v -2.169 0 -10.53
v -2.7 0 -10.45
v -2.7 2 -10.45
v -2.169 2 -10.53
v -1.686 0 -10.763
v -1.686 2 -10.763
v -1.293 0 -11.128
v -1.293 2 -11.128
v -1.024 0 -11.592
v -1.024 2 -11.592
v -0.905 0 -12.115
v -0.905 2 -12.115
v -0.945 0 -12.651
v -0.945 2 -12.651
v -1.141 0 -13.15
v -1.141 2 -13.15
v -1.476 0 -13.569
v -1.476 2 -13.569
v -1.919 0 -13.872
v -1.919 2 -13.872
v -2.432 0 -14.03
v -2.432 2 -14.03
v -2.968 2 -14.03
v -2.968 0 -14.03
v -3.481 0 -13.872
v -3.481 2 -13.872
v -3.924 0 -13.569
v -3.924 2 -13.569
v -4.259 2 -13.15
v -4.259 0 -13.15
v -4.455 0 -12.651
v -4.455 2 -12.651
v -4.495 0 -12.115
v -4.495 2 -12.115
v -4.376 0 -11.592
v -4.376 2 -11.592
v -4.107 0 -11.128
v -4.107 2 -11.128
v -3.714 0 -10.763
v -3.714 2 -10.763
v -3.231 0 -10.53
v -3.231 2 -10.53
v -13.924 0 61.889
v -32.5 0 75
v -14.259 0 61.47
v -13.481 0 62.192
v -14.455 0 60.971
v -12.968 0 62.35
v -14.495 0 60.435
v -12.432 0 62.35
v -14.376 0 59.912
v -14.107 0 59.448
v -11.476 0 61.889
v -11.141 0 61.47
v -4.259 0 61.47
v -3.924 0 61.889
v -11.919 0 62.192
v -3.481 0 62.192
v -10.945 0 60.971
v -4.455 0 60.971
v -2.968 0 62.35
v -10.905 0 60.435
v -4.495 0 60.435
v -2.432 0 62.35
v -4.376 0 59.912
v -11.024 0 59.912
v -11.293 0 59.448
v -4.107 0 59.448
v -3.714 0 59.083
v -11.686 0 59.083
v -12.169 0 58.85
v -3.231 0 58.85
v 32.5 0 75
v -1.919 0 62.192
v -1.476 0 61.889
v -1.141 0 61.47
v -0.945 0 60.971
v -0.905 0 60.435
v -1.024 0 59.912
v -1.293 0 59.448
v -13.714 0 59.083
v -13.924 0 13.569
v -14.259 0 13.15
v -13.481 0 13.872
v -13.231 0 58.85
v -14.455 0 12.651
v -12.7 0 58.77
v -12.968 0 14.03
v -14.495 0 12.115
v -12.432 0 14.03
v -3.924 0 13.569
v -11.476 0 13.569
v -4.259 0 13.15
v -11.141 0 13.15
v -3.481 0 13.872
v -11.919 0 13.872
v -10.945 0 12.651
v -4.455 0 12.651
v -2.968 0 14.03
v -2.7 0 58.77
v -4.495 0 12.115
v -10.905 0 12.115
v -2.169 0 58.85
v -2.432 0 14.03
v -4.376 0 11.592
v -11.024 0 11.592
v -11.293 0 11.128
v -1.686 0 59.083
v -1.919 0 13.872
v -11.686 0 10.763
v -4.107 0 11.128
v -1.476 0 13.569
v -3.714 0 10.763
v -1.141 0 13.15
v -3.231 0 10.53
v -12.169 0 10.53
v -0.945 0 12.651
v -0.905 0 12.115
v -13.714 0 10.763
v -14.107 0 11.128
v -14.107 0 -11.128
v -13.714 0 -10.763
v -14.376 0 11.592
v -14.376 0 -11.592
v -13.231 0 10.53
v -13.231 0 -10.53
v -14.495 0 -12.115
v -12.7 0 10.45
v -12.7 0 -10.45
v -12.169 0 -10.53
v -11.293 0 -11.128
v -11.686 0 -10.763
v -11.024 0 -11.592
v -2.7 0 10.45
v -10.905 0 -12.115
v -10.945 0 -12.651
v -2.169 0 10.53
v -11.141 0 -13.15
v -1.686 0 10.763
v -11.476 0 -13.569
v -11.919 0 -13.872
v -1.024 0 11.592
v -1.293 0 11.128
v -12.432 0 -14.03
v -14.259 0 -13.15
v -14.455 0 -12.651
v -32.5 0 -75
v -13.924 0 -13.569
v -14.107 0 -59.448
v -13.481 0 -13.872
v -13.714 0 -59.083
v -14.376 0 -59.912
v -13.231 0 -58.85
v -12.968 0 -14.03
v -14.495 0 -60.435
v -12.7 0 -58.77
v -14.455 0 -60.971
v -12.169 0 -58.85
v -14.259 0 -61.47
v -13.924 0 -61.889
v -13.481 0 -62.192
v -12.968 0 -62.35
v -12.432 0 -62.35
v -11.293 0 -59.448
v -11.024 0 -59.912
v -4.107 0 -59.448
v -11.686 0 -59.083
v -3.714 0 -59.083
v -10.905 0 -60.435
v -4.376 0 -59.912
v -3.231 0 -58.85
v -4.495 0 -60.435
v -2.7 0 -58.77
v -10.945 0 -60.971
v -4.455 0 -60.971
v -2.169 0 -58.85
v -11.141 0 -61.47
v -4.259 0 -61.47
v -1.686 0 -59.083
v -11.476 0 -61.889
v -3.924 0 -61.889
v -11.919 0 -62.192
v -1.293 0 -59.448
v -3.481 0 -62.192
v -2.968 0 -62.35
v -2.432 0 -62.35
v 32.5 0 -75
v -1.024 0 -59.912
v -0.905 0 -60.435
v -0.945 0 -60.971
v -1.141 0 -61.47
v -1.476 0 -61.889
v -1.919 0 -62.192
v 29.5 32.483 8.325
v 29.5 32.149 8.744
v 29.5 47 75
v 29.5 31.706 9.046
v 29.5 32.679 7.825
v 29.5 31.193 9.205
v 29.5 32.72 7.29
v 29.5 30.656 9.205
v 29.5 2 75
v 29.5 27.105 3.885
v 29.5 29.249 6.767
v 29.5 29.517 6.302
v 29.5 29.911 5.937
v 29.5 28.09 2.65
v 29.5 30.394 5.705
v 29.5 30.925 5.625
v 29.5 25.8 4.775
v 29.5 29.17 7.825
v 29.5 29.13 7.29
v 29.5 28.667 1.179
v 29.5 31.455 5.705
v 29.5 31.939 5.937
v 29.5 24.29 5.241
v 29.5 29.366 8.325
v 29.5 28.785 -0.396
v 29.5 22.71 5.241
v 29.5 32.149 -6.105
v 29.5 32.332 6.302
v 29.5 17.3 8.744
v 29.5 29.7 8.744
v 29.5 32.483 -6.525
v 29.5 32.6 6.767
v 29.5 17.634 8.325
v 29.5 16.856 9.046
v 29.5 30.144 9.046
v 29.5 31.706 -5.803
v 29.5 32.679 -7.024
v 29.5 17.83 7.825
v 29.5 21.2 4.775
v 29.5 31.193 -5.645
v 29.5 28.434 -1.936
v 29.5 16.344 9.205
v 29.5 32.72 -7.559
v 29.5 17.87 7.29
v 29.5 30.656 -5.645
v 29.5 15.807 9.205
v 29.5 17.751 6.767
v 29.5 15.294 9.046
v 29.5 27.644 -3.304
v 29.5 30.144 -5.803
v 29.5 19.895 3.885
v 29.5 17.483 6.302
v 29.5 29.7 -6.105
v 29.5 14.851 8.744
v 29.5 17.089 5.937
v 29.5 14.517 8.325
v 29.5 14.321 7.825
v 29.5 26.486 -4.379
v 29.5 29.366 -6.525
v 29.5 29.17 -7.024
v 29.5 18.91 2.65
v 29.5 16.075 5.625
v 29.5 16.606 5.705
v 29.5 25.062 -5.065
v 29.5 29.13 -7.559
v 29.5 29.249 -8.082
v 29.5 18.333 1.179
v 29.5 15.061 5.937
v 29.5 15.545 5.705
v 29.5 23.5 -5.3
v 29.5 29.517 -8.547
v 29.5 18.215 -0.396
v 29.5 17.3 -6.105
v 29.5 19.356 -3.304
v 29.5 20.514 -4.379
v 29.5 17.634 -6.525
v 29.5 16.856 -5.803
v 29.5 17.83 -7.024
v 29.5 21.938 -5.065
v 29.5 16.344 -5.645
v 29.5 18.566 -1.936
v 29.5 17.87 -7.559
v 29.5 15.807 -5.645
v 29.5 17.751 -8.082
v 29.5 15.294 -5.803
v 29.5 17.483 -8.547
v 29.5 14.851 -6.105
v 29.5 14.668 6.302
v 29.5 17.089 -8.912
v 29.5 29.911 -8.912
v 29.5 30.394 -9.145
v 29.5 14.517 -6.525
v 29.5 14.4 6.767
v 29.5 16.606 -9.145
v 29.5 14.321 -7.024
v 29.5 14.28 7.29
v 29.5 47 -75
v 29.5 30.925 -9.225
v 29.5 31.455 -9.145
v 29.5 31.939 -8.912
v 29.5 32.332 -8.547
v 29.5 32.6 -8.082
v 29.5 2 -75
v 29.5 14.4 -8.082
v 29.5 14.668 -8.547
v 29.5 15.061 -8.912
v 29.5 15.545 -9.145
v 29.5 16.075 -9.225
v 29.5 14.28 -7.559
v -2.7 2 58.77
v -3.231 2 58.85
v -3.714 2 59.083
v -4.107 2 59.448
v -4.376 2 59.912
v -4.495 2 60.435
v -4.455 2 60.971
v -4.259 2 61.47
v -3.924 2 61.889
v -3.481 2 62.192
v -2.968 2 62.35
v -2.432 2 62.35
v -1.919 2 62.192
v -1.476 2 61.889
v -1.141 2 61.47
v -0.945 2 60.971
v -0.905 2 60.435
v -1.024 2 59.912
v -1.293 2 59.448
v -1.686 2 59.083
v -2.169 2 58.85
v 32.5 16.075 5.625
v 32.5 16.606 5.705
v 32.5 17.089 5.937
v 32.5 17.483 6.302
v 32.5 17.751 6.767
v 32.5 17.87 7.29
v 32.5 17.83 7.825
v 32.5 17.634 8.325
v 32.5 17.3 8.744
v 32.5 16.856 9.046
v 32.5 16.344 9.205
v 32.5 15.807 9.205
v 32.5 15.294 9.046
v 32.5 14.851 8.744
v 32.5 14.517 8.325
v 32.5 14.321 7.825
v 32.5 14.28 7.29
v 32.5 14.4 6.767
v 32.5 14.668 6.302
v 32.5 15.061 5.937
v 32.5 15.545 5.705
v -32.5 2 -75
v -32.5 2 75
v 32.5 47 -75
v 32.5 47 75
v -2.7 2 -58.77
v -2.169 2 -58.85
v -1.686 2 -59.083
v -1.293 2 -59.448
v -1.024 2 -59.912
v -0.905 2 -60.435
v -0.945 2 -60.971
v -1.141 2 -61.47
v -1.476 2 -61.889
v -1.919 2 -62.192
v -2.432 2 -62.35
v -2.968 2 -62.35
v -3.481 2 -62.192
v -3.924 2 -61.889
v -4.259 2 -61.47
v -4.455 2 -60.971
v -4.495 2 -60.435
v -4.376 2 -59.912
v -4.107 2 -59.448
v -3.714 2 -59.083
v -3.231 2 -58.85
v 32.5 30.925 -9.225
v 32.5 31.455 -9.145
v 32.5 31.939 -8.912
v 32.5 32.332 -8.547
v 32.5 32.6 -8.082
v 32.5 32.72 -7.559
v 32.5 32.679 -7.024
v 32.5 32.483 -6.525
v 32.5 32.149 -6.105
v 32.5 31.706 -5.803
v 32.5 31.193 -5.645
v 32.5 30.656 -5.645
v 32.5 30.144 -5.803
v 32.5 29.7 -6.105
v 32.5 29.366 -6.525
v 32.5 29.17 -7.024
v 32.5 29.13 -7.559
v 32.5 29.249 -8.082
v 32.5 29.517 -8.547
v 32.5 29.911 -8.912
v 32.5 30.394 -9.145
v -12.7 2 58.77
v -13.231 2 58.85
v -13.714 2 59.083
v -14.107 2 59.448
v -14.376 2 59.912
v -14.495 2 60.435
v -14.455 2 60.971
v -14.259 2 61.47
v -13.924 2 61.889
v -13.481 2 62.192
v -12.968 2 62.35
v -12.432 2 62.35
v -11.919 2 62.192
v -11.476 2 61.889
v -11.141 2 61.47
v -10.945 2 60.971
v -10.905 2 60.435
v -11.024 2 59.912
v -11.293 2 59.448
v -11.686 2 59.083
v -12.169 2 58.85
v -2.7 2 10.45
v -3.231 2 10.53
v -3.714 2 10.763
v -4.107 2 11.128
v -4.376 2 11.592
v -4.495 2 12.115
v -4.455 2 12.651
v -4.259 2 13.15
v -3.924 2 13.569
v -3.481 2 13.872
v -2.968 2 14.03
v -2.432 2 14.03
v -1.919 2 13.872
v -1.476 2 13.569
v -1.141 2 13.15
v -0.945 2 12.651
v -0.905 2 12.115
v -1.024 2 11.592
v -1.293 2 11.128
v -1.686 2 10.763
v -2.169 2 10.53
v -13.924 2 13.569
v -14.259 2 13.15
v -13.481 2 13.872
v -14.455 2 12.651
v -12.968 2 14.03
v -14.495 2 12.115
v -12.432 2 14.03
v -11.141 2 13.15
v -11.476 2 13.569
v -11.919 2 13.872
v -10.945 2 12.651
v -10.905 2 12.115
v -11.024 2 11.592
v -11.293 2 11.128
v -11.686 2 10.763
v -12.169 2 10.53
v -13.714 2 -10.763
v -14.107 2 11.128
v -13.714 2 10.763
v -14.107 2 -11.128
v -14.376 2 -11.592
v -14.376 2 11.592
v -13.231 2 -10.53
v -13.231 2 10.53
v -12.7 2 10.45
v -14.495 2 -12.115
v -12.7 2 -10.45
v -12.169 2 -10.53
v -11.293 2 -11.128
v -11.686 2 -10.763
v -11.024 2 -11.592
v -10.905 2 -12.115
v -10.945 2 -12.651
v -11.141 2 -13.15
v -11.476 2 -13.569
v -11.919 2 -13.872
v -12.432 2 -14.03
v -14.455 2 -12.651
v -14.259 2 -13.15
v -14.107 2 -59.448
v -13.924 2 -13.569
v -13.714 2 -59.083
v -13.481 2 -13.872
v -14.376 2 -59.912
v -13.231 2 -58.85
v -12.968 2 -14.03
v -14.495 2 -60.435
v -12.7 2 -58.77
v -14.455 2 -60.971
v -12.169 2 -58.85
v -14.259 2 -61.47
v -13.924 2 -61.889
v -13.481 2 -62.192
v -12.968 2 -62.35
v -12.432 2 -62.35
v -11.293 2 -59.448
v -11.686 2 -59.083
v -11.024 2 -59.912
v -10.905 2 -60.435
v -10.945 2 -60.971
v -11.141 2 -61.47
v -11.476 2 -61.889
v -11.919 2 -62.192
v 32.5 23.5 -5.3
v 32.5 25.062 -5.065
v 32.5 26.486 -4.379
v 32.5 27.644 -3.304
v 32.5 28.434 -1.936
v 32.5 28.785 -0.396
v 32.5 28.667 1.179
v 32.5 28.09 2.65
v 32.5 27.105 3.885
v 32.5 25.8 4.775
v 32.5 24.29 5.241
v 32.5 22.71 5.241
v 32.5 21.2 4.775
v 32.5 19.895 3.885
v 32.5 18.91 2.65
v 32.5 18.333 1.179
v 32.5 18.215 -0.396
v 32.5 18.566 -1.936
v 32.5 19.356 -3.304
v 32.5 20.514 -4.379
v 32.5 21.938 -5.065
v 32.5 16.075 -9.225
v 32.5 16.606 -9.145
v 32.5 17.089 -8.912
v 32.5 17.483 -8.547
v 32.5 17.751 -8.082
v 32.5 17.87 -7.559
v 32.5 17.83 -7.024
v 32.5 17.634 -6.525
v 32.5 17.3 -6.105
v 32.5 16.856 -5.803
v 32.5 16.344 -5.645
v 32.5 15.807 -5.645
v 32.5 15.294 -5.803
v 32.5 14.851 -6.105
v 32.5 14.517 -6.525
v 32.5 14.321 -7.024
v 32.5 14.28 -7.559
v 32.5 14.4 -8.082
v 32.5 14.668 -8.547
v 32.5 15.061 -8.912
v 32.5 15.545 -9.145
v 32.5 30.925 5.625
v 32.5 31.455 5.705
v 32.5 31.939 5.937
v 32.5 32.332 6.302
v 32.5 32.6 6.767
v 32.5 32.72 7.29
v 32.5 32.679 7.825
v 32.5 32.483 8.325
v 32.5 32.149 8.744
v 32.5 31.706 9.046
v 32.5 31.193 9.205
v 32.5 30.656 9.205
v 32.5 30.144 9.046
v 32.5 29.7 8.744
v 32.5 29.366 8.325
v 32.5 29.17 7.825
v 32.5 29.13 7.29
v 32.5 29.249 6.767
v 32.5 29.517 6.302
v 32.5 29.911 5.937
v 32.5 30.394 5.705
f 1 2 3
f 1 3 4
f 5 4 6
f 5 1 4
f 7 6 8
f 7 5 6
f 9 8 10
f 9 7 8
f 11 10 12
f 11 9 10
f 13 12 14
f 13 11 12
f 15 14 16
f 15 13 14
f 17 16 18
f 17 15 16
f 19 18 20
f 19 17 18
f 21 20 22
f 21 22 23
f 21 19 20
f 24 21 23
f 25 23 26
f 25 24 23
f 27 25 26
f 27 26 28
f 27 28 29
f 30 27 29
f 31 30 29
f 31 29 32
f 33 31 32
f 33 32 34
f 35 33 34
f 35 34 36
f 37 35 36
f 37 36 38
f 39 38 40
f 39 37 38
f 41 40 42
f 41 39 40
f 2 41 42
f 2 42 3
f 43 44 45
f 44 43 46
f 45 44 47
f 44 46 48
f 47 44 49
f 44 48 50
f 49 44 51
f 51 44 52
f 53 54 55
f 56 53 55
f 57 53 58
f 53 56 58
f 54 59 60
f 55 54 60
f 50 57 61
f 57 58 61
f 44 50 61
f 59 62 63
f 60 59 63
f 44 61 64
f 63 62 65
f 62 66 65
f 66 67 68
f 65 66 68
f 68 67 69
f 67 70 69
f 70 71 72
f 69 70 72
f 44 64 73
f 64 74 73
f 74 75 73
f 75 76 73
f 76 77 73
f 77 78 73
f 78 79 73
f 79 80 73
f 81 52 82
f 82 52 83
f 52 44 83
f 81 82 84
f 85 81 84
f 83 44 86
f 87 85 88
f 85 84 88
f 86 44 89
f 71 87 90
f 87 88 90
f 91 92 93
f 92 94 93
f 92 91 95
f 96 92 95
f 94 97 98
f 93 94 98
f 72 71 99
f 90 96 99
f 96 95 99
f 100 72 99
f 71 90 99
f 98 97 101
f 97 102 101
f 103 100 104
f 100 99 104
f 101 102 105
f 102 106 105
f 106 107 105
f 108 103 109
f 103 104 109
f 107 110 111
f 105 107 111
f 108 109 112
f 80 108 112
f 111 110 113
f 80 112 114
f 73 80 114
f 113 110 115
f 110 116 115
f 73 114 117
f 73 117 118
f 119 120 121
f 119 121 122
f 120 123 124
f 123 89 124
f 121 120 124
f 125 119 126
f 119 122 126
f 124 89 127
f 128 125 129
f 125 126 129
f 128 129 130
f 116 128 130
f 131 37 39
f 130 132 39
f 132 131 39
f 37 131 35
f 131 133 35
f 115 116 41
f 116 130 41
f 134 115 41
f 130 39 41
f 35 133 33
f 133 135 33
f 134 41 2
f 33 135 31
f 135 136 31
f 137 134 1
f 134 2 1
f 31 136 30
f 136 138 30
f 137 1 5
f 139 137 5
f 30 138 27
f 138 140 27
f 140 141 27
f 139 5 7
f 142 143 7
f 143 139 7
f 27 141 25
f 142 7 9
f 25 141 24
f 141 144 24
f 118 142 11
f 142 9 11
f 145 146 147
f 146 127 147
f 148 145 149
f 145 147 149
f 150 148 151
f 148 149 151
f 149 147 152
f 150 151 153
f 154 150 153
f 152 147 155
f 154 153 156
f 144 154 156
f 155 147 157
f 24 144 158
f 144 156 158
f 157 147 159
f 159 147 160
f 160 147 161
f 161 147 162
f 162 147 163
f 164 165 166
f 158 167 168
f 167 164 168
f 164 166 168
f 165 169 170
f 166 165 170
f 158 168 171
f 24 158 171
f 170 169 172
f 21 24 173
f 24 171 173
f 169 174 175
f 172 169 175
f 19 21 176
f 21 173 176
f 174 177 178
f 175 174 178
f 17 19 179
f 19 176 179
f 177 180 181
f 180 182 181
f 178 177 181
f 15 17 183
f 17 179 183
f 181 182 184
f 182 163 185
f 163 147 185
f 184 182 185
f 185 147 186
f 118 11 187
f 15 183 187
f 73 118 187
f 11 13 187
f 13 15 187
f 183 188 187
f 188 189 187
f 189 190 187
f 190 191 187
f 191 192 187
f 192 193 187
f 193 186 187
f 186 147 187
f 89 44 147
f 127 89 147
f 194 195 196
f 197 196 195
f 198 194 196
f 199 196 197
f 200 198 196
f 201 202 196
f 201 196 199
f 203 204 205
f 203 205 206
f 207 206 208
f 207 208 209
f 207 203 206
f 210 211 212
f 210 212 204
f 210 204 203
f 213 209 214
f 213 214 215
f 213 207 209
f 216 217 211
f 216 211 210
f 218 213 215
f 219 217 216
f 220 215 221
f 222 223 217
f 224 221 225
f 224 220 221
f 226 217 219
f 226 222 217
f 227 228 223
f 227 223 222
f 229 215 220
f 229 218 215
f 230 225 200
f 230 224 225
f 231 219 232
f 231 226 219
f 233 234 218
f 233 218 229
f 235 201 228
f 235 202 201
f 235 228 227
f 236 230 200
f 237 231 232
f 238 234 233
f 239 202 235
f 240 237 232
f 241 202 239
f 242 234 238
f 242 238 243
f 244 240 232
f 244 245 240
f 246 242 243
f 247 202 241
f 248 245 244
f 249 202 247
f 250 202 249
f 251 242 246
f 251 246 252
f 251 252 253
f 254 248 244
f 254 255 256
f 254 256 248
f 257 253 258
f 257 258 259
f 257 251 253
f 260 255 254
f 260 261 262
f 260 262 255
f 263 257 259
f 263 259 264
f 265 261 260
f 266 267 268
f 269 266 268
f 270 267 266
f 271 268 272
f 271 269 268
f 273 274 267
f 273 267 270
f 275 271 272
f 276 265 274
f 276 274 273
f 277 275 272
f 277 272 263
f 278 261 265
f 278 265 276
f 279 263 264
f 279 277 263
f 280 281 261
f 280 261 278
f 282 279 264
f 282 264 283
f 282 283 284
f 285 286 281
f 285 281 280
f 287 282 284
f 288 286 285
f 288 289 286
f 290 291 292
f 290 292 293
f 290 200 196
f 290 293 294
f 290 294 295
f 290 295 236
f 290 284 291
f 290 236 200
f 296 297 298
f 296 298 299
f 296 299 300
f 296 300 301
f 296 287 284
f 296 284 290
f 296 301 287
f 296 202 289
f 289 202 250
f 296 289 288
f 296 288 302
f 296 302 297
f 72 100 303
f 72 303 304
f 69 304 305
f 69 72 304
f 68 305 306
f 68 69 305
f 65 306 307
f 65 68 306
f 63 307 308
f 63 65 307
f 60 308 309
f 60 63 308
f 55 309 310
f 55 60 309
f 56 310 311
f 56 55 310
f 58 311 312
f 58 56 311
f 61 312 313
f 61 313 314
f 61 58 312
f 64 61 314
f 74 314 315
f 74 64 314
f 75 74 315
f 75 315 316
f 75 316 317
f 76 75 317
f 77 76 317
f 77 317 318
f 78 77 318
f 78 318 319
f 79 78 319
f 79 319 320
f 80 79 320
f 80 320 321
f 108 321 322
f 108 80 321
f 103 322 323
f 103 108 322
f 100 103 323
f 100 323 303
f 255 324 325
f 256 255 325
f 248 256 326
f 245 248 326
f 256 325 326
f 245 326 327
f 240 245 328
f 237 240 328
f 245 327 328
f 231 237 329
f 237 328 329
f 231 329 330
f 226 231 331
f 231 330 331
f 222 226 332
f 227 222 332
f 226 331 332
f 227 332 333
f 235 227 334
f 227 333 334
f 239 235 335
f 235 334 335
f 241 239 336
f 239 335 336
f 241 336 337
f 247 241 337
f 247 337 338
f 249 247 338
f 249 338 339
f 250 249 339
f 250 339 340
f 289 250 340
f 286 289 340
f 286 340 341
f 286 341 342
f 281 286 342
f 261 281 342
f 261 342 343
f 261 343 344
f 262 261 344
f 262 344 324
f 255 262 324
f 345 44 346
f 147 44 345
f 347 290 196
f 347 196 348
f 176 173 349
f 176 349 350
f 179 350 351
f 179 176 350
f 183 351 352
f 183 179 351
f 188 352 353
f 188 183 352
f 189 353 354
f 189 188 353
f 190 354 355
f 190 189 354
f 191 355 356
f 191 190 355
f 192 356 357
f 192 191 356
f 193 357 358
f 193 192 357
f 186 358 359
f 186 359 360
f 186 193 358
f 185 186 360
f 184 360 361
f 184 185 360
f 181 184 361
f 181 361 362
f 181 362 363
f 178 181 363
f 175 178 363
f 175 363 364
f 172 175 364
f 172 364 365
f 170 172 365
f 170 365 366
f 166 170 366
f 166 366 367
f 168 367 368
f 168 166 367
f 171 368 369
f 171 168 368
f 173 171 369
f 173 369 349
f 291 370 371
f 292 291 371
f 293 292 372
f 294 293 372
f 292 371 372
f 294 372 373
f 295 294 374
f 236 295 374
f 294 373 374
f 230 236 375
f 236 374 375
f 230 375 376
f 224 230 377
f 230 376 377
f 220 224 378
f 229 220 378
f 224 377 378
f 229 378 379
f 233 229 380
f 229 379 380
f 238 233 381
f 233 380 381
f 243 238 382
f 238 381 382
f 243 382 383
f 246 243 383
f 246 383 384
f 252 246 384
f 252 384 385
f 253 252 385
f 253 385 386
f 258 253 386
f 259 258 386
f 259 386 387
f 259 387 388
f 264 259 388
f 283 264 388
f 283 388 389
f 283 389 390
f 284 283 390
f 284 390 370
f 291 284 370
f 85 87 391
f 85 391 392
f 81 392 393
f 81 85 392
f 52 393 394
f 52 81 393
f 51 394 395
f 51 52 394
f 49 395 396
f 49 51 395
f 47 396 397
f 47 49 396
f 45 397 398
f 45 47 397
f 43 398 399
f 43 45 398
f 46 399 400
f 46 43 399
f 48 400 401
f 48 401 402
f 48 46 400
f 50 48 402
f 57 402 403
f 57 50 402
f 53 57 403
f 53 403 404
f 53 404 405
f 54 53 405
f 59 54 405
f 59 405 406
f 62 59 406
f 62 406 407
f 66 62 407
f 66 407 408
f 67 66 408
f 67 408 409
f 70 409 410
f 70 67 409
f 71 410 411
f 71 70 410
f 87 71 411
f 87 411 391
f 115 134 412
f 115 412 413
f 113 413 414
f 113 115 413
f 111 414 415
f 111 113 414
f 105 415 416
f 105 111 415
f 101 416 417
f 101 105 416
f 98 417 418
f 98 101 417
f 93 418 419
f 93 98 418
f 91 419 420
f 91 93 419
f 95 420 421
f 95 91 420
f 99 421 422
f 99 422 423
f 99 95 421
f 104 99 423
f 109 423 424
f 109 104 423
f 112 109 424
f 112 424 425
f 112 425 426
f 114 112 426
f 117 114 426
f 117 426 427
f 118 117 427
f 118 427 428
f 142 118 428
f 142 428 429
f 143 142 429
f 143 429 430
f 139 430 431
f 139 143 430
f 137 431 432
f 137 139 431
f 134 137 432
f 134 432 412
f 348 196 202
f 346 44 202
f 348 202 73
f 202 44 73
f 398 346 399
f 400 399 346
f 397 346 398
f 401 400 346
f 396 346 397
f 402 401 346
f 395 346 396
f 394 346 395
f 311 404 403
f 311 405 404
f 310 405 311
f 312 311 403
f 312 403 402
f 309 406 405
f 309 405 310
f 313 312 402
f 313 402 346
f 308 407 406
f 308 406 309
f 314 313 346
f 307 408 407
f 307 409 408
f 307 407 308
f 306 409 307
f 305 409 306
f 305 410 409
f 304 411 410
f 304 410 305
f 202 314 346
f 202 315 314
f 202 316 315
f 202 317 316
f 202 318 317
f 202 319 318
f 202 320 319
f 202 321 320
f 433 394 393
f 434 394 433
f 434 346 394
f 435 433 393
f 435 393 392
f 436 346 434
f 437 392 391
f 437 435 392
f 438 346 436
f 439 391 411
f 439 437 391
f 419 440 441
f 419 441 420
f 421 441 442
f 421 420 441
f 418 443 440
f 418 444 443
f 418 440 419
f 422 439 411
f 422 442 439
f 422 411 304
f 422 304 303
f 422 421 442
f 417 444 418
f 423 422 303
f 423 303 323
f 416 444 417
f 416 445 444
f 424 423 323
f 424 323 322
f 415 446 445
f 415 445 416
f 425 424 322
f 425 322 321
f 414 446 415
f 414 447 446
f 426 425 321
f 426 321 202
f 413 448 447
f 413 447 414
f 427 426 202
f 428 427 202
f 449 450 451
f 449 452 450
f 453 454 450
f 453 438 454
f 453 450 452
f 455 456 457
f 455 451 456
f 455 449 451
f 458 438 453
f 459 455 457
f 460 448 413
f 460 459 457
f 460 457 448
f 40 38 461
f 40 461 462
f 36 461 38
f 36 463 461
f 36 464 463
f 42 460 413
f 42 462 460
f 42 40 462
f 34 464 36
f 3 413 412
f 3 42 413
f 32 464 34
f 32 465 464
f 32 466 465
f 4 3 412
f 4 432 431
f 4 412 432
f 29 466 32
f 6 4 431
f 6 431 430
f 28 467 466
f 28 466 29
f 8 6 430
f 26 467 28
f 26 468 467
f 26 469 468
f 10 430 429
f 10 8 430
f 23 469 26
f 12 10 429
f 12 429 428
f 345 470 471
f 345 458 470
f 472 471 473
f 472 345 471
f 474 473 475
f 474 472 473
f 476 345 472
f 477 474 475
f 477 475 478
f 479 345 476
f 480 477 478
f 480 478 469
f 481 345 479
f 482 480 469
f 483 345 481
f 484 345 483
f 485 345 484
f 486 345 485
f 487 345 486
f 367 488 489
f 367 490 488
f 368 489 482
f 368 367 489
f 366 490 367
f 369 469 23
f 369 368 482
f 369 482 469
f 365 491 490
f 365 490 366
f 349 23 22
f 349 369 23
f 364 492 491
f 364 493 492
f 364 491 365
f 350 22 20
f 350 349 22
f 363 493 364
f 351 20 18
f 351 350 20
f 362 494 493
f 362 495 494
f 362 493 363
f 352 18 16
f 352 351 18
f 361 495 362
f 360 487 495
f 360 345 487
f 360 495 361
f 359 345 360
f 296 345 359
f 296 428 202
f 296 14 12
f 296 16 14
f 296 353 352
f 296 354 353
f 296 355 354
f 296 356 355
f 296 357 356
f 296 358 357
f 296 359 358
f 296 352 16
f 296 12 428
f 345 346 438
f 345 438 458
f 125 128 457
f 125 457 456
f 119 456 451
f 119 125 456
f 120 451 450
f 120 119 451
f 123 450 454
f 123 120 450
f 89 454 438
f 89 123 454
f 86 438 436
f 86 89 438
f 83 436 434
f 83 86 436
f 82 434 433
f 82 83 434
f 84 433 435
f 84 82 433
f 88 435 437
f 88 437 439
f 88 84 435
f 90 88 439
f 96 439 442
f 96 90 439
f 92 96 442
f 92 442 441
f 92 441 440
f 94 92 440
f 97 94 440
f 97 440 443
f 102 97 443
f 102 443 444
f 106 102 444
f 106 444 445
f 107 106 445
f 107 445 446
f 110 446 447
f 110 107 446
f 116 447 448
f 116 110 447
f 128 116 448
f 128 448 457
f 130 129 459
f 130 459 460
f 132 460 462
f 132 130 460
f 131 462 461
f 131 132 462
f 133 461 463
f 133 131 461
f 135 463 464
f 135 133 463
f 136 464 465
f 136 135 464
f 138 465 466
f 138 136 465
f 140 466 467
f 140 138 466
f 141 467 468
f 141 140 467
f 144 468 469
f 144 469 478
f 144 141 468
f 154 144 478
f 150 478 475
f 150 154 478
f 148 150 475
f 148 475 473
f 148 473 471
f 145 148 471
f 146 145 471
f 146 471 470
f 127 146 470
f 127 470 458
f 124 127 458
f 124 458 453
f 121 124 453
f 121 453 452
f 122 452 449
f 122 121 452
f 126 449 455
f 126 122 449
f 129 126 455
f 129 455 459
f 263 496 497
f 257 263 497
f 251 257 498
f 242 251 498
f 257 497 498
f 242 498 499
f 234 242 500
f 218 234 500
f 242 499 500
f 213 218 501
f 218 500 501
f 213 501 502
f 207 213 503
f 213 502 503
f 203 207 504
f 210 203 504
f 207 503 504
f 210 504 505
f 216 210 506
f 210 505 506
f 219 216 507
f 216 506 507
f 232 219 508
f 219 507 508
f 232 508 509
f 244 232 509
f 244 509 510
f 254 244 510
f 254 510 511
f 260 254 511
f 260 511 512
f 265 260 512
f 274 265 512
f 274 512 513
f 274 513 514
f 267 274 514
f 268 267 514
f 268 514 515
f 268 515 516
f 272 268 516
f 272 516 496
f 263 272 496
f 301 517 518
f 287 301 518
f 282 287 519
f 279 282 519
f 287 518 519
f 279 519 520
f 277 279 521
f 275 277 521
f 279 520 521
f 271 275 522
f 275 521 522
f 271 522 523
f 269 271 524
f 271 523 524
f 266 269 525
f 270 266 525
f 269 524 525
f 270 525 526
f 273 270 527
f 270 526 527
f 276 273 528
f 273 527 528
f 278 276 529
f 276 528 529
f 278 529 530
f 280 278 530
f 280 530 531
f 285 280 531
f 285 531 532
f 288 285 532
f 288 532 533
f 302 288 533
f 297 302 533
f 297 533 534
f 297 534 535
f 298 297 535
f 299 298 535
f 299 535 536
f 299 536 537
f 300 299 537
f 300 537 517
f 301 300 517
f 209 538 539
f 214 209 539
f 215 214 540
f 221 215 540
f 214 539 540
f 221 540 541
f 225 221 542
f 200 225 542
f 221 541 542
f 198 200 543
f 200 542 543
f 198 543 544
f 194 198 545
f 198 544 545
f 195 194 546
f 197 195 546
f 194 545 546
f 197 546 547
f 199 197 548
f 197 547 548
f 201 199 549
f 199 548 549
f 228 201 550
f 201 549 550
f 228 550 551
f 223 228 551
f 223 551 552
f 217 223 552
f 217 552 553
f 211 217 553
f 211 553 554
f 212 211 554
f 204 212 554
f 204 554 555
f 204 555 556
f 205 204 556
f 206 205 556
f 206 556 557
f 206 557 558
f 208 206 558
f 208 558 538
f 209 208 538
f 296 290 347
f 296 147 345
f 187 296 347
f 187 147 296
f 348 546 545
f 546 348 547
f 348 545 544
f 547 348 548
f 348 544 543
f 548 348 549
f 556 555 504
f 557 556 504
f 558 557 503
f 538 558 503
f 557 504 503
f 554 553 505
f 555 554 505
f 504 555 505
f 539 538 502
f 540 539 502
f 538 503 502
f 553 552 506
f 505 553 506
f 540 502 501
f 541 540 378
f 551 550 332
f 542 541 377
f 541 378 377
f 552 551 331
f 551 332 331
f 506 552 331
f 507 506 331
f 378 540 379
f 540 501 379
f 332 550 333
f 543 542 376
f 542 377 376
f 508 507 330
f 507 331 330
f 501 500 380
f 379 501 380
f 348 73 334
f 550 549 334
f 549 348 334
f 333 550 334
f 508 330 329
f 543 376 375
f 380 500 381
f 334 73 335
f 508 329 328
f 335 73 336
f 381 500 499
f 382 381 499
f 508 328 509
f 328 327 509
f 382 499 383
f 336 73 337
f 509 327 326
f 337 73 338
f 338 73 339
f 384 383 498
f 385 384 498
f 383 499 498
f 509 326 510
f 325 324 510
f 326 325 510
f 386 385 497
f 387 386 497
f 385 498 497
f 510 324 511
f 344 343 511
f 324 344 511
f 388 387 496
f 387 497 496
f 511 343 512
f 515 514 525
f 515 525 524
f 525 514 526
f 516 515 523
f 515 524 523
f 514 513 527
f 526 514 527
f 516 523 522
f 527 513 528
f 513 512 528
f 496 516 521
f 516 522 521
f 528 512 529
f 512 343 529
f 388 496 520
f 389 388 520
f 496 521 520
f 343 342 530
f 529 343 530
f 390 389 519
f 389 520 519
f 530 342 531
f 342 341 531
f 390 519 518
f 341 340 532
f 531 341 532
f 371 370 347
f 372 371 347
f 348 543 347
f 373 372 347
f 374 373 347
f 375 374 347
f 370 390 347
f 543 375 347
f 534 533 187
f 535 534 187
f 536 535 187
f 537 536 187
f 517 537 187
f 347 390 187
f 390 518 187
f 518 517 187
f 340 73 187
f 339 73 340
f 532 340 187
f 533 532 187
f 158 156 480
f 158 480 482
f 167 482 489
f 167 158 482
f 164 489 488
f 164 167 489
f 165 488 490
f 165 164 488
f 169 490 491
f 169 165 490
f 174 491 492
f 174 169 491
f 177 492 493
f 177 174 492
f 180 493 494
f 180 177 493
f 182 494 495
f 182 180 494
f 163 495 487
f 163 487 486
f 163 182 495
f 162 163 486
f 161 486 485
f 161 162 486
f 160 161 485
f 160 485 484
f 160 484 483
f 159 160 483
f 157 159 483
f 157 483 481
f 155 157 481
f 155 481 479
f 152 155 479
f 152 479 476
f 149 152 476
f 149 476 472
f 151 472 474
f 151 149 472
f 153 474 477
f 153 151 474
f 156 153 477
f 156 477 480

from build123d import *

# Parameters (mm, degrees)
CROQUIS1_W              = 65
CROQUIS1_H              = 150
CROQUIS1_R              = 1.8
SALIENTE_EXTRUIR1_DEPTH = 2
CROQUIS2_W              = 3
CROQUIS2_H              = 150
SALIENTE_EXTRUIR2_DEPTH = 45
CROQUIS3_R              = 5.3
CROQUIS3_R_2            = 1.8
CORTAR_EXTRUIR1_DEPTH   = 10


with BuildPart() as part:
    # Croquis1 → Saliente-Extruir1 (new body)
    with BuildSketch(Plane(origin=(0, 0, 0), x_dir=(1, 0, 0), z_dir=(0, 1, 0))):
        Rectangle(CROQUIS1_W, CROQUIS1_H)
        with Locations(Location((-2.7, 12.25, 0), (0, 0, 270))):
            Circle(CROQUIS1_R, mode=Mode.SUBTRACT)
        with Locations(Location((-2.7, 60.57, 0), (0, 0, 270))):
            Circle(CROQUIS1_R, mode=Mode.SUBTRACT)
        with Locations(Location((-12.7, -60.57, 0), (0, 0, 90))):
            Circle(CROQUIS1_R, mode=Mode.SUBTRACT)
        with Locations(Location((-2.7, -60.57, 0), (0, 0, 90))):
            Circle(CROQUIS1_R, mode=Mode.SUBTRACT)
        with Locations(Location((-12.7, 12.25, 0), (0, 0, 270))):
            Circle(CROQUIS1_R, mode=Mode.SUBTRACT)
        with Locations(Location((-12.7, 60.57, 0), (0, 0, 270))):
            Circle(CROQUIS1_R, mode=Mode.SUBTRACT)
        with Locations(Location((-12.7, -12.25, 0), (0, 0, 90))):
            Circle(CROQUIS1_R, mode=Mode.SUBTRACT)
        with Locations(Location((-2.7, -12.25, 0), (0, 0, 90))):
            Circle(CROQUIS1_R, mode=Mode.SUBTRACT)
    extrude(amount=SALIENTE_EXTRUIR1_DEPTH)

    # Croquis2 → Saliente-Extruir2 (add)
    with BuildSketch(Plane(origin=(0, 2, 0), x_dir=(1, 0, 0), z_dir=(0, 1, 0))):
        with Locations((31, 0)):
            Rectangle(CROQUIS2_W, CROQUIS2_H)
    extrude(amount=SALIENTE_EXTRUIR2_DEPTH)

    # Croquis3 → Cortar-Extruir1 (cut)
    with BuildSketch(Plane(origin=(32.5, 0, 0), x_dir=(0, 0, -1), z_dir=(1, 0, 0))):
        with Locations((0, 23.5)):
            Circle(CROQUIS3_R)
        with Locations((-7.424621202, 16.075378798)):
            Circle(CROQUIS3_R_2)
        with Locations((-7.424621202, 30.924621202)):
            Circle(CROQUIS3_R_2)
        with Locations((7.424621202, 30.924621202)):
            Circle(CROQUIS3_R_2)
        with Locations((7.424621202, 16.075378798)):
            Circle(CROQUIS3_R_2)
    extrude(amount=-CORTAR_EXTRUIR1_DEPTH, mode=Mode.SUBTRACT)


solid = part.part
